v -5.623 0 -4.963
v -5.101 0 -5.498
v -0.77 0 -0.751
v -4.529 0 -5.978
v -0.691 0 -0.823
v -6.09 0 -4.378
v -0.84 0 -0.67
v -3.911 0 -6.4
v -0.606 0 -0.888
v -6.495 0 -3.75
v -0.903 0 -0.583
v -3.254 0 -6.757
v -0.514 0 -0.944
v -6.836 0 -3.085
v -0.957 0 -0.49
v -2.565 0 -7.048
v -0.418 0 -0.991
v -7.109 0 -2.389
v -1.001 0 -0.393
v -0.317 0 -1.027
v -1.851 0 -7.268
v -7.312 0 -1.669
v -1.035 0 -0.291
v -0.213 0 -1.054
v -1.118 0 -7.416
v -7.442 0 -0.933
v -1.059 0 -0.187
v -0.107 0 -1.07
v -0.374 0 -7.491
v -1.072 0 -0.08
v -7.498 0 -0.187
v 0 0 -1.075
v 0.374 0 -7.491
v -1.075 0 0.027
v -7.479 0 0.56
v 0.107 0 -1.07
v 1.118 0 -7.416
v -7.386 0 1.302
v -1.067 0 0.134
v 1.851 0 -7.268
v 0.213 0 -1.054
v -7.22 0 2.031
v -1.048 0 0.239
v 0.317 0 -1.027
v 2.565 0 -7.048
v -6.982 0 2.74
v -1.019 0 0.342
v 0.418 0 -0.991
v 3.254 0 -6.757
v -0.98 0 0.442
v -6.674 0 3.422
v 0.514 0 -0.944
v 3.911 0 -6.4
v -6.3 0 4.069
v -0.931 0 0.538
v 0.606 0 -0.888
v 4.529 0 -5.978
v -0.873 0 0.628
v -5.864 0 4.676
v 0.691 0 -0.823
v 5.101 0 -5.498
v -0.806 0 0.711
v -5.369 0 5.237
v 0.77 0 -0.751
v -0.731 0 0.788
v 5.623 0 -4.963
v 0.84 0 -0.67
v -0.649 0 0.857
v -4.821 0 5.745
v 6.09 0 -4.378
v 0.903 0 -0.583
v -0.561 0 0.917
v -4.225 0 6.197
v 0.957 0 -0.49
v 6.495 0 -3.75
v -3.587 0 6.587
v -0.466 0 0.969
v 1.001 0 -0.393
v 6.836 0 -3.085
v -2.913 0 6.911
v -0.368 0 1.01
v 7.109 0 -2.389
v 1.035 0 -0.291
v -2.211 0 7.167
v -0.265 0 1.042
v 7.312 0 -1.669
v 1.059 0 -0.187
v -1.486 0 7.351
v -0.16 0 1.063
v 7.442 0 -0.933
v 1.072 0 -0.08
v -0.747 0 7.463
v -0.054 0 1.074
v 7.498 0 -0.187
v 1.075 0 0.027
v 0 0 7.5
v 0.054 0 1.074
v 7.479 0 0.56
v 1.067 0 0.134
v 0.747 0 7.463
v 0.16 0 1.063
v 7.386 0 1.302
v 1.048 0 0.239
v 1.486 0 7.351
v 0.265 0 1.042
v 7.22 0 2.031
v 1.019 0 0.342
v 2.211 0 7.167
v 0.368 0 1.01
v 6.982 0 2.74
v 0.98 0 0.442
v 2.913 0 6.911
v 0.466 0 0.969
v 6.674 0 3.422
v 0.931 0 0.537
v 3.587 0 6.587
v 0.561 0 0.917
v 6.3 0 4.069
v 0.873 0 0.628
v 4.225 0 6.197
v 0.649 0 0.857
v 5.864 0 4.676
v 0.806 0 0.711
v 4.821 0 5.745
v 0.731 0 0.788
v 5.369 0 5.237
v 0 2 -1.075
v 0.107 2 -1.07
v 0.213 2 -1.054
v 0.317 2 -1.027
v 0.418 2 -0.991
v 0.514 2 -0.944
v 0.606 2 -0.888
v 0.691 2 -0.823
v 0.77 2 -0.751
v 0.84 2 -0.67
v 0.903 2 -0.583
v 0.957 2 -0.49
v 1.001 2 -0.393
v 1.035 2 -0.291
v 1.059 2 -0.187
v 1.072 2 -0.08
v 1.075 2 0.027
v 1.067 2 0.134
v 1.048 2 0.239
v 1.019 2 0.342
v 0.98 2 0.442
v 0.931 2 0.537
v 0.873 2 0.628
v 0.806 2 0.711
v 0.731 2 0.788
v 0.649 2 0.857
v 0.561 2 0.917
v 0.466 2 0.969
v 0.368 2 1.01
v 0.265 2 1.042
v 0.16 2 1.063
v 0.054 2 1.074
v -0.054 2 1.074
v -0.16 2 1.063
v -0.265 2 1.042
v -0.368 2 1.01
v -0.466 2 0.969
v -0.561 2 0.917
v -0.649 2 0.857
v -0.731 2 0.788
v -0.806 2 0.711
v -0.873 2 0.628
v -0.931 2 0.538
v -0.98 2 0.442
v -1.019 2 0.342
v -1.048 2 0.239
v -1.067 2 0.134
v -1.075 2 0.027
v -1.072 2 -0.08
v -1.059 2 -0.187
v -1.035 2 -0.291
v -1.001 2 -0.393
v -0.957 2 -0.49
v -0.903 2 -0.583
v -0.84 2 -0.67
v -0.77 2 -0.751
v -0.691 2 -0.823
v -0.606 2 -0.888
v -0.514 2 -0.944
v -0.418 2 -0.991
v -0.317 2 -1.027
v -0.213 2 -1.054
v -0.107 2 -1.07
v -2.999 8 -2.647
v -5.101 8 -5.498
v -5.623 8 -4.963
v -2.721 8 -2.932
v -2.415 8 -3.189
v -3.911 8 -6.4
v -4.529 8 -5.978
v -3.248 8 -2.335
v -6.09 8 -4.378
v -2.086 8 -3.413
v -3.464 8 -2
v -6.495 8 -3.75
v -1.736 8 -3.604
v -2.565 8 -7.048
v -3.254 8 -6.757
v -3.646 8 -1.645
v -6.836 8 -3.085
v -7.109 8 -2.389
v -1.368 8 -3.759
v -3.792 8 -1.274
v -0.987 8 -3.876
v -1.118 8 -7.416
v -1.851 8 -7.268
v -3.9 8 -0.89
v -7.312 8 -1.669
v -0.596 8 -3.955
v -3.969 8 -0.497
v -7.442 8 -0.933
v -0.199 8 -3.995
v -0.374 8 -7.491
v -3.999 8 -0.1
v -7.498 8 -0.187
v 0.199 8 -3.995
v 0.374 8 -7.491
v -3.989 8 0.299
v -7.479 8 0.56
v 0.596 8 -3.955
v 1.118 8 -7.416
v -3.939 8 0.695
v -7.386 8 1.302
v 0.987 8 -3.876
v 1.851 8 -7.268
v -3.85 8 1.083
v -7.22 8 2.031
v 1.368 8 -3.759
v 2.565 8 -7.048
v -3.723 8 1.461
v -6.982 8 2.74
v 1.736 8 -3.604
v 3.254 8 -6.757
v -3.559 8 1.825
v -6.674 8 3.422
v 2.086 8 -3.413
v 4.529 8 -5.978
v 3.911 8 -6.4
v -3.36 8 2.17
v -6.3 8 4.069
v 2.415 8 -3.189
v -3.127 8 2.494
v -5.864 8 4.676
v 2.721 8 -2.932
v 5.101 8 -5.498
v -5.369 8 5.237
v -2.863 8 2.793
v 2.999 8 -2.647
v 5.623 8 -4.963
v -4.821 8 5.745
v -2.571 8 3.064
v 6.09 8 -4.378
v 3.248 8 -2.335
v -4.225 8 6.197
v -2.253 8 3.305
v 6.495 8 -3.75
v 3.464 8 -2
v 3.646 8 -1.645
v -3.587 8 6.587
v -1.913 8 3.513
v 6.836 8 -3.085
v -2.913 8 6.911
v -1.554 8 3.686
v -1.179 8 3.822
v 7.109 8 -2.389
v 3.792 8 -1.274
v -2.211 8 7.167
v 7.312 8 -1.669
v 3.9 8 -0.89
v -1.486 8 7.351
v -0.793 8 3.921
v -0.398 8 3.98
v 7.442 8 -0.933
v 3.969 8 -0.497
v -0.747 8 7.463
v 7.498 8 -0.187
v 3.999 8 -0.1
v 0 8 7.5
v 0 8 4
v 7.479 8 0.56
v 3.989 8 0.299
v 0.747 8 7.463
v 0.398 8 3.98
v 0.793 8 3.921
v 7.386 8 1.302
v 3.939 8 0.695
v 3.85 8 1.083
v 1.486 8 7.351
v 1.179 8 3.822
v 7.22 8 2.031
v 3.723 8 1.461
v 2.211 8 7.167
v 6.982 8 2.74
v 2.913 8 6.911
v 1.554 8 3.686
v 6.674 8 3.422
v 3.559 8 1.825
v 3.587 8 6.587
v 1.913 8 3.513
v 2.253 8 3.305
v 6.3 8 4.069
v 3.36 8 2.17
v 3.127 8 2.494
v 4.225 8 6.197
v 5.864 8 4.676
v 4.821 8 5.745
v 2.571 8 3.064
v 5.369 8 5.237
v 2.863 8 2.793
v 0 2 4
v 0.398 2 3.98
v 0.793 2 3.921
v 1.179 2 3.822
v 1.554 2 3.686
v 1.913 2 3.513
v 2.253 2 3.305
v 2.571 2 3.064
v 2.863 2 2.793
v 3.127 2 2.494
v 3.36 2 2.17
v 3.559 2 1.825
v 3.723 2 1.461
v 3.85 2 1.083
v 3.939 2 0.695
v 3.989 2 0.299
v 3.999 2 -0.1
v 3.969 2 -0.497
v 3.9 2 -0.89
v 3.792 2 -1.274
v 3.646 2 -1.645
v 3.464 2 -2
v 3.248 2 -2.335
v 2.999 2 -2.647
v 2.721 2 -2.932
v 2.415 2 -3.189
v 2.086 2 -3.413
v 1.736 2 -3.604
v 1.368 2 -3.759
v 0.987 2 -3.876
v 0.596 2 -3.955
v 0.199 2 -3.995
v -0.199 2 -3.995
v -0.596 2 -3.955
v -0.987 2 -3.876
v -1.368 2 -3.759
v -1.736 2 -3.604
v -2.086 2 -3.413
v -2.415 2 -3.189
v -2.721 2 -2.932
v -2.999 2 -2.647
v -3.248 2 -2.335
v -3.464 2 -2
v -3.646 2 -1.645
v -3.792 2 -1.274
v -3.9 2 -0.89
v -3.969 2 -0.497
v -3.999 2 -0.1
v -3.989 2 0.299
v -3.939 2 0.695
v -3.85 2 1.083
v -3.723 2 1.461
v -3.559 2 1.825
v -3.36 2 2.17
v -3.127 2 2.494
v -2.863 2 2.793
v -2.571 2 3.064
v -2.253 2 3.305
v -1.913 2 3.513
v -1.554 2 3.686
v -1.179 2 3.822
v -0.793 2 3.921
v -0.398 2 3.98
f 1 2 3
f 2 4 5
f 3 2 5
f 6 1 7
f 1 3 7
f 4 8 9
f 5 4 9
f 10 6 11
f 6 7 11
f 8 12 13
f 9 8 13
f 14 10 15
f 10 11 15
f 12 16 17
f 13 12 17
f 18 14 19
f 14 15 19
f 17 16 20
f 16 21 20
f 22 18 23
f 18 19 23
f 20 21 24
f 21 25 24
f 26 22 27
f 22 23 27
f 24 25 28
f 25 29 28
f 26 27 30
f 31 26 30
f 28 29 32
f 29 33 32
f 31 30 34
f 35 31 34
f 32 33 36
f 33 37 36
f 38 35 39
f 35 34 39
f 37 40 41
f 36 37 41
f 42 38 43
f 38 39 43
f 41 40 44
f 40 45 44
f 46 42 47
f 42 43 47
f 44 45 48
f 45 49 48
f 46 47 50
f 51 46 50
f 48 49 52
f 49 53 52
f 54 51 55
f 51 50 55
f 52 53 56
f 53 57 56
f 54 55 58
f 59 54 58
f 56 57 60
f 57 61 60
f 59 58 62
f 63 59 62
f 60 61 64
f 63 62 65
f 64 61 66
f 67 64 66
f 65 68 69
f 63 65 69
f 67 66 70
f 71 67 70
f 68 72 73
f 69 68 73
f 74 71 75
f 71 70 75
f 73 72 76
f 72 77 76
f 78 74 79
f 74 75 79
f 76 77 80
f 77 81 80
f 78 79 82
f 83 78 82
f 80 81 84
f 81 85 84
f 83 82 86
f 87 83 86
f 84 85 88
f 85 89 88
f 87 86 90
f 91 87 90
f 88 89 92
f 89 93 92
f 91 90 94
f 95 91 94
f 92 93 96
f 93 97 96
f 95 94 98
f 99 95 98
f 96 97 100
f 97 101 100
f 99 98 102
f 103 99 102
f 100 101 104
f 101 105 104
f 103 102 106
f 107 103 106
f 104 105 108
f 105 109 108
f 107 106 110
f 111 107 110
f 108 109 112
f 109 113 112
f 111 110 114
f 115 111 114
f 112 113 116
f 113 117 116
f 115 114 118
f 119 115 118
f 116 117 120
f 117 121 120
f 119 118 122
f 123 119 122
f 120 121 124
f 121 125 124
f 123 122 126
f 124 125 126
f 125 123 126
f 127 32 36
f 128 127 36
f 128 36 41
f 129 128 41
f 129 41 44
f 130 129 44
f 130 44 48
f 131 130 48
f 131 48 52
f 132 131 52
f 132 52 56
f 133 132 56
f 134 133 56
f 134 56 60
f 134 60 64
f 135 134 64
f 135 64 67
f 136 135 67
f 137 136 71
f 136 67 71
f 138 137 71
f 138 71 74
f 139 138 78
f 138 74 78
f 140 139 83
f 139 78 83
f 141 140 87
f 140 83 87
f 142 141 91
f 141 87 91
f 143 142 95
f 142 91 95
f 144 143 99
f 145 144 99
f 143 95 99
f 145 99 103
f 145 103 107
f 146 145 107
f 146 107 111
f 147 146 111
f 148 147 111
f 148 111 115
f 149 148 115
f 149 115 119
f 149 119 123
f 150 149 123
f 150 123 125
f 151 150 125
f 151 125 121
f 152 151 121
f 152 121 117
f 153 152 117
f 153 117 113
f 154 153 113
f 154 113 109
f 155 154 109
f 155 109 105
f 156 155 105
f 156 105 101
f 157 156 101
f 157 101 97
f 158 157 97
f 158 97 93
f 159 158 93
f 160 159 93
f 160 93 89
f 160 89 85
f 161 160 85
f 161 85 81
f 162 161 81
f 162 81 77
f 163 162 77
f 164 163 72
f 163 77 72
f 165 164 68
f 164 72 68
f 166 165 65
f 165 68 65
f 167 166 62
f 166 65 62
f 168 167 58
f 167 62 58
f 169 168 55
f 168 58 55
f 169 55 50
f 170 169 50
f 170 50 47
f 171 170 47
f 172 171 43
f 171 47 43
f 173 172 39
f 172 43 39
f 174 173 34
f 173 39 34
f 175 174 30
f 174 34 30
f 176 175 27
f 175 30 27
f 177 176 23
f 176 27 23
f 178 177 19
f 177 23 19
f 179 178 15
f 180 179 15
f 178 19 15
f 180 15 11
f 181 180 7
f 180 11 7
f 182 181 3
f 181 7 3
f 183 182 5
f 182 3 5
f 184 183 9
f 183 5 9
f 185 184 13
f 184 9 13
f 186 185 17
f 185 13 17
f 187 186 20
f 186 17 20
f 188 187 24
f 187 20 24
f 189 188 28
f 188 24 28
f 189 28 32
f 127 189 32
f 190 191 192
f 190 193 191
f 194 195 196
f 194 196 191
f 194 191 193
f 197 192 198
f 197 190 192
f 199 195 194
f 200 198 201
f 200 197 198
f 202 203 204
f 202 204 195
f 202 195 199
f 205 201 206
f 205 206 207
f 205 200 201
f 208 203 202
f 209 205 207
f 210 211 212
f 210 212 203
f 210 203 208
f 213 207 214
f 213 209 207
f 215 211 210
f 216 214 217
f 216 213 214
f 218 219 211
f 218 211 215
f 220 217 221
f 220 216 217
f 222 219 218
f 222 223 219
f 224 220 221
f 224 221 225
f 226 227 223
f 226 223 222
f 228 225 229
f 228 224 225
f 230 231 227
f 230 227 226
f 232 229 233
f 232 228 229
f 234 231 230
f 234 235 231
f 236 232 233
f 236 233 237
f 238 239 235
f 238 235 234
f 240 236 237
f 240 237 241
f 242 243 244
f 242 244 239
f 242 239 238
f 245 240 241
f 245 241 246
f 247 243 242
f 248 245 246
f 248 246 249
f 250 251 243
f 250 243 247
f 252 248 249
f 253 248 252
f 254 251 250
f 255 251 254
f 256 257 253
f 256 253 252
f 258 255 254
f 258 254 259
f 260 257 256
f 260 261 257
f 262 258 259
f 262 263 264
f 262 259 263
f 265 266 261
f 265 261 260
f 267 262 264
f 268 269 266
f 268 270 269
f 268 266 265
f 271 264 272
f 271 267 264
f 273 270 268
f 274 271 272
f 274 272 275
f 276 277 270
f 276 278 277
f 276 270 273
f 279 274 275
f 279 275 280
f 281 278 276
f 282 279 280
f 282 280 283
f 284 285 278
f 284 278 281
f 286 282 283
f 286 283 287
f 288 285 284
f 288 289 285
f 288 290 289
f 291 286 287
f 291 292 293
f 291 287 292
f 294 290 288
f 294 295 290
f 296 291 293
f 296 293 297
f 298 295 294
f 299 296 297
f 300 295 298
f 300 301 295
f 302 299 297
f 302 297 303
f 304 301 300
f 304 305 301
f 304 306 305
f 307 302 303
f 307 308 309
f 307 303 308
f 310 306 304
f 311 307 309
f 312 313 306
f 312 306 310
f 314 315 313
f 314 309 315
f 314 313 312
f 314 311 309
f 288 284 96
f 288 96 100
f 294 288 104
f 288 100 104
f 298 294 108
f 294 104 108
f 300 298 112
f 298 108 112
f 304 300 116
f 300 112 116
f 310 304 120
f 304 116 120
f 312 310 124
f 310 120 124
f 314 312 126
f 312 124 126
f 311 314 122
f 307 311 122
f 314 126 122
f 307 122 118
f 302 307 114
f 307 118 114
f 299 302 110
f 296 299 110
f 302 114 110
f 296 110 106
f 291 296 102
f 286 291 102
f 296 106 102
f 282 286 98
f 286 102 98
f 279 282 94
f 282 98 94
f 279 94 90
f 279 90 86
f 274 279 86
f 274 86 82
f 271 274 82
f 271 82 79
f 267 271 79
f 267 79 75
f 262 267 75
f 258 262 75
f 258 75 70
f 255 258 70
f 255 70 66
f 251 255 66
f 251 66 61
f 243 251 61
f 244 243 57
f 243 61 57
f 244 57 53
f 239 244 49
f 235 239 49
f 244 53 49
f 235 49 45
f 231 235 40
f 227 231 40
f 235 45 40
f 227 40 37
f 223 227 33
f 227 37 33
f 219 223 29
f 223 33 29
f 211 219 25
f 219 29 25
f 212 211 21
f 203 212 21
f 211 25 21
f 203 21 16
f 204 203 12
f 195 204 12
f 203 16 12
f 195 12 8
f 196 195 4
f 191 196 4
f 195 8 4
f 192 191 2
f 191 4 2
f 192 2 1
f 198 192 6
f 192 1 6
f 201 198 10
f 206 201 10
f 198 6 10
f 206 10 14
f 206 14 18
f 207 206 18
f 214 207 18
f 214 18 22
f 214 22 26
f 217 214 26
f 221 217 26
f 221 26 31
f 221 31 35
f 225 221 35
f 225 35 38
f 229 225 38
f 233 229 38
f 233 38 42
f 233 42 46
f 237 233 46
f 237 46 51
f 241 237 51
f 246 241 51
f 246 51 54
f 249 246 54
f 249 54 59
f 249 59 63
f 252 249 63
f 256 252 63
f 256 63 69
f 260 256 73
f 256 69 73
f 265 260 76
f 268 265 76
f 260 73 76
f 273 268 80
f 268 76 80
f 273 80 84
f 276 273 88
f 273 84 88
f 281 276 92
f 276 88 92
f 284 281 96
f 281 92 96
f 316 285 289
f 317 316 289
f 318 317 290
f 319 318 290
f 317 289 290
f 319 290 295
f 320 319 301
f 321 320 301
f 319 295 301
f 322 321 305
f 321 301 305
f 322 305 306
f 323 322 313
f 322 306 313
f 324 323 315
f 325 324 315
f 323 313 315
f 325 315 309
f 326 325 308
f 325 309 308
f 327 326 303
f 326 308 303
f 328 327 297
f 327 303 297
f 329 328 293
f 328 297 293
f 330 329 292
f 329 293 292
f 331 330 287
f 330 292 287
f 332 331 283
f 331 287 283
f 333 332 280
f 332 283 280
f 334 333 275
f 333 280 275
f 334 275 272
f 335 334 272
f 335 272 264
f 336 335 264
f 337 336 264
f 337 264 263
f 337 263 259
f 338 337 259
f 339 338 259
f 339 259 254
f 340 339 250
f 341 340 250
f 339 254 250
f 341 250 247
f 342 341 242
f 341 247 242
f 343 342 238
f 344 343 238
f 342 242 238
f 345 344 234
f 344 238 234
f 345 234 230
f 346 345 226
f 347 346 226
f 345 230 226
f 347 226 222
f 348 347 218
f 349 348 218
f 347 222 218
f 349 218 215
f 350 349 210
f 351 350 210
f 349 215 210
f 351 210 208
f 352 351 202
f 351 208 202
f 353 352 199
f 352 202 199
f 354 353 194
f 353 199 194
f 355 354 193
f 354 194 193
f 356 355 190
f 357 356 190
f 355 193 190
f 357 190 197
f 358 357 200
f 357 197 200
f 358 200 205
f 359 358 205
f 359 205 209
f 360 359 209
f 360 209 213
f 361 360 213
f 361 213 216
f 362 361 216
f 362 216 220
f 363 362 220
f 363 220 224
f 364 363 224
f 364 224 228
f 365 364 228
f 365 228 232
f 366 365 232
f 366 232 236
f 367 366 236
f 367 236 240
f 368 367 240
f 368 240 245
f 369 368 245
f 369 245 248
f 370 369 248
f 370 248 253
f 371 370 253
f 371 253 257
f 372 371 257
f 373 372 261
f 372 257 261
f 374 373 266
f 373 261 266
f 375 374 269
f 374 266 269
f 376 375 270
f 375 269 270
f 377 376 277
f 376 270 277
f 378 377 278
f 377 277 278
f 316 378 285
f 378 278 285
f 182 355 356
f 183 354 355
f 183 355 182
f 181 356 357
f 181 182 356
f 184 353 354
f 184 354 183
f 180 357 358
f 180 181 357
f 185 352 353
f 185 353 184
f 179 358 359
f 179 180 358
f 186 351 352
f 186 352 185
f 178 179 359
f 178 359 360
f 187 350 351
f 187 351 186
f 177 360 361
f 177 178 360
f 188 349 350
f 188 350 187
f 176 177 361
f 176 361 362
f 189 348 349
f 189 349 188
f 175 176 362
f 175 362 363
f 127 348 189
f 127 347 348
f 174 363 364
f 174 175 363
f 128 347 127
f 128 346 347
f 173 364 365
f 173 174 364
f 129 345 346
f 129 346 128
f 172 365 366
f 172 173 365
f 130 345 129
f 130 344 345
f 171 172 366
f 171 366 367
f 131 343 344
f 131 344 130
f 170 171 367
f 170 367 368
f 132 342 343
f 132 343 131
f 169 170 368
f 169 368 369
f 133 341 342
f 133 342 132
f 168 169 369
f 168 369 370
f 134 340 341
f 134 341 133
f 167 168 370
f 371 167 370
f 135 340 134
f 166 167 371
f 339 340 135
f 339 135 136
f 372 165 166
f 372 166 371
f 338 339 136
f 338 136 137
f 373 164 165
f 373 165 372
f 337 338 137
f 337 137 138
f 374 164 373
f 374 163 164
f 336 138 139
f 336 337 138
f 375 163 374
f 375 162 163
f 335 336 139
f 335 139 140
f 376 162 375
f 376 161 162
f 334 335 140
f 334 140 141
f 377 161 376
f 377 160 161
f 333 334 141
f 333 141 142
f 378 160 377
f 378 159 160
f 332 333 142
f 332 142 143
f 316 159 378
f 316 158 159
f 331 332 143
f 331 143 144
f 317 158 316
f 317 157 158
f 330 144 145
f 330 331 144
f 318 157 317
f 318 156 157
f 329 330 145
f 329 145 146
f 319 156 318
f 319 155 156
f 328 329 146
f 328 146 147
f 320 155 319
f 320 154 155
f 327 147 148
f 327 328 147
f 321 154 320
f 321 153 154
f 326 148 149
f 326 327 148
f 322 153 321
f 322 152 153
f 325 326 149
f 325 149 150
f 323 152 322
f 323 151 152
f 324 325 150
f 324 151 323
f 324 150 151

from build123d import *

# Parameters (mm, degrees)
SKETCH1_R           = 7.5
BOSS_EXTRUDE1_DEPTH = 8
SKETCH2_R           = 4
CUT_EXTRUDE1_DEPTH  = 6
SKETCH3_R           = 1.075
CUT_EXTRUDE2_DEPTH  = 6


with BuildPart() as part:
    # Sketch1 → Boss-Extrude1 (new body)
    with BuildSketch(Plane(origin=(0, 0, 0), x_dir=(1, 0, 0), z_dir=(0, 1, 0))):
        with Locations(Location((0, 0, 0), (0, 0, 270))):  # turned: the seam where the file's is
            Circle(SKETCH1_R)
    extrude(amount=BOSS_EXTRUDE1_DEPTH)

    # Sketch2 → Cut-Extrude1 (cut)
    with BuildSketch(Plane(origin=(0, 8, 0), x_dir=(1, 0, 0), z_dir=(0, 1, 0))):
        with Locations(Location((0, 0, 0), (0, 0, 270))):  # turned: the seam where the file's is
            Circle(SKETCH2_R)
    extrude(amount=-CUT_EXTRUDE1_DEPTH, mode=Mode.SUBTRACT)

    # Sketch3 → Cut-Extrude2 (cut)
    with BuildSketch(Plane.XZ):
        with Locations(Location((0, 0, 0), (0, 0, 270))):  # turned: the seam where the file's is
            Circle(SKETCH3_R)
    extrude(amount=-CUT_EXTRUDE2_DEPTH, mode=Mode.SUBTRACT)


solid = part.part
